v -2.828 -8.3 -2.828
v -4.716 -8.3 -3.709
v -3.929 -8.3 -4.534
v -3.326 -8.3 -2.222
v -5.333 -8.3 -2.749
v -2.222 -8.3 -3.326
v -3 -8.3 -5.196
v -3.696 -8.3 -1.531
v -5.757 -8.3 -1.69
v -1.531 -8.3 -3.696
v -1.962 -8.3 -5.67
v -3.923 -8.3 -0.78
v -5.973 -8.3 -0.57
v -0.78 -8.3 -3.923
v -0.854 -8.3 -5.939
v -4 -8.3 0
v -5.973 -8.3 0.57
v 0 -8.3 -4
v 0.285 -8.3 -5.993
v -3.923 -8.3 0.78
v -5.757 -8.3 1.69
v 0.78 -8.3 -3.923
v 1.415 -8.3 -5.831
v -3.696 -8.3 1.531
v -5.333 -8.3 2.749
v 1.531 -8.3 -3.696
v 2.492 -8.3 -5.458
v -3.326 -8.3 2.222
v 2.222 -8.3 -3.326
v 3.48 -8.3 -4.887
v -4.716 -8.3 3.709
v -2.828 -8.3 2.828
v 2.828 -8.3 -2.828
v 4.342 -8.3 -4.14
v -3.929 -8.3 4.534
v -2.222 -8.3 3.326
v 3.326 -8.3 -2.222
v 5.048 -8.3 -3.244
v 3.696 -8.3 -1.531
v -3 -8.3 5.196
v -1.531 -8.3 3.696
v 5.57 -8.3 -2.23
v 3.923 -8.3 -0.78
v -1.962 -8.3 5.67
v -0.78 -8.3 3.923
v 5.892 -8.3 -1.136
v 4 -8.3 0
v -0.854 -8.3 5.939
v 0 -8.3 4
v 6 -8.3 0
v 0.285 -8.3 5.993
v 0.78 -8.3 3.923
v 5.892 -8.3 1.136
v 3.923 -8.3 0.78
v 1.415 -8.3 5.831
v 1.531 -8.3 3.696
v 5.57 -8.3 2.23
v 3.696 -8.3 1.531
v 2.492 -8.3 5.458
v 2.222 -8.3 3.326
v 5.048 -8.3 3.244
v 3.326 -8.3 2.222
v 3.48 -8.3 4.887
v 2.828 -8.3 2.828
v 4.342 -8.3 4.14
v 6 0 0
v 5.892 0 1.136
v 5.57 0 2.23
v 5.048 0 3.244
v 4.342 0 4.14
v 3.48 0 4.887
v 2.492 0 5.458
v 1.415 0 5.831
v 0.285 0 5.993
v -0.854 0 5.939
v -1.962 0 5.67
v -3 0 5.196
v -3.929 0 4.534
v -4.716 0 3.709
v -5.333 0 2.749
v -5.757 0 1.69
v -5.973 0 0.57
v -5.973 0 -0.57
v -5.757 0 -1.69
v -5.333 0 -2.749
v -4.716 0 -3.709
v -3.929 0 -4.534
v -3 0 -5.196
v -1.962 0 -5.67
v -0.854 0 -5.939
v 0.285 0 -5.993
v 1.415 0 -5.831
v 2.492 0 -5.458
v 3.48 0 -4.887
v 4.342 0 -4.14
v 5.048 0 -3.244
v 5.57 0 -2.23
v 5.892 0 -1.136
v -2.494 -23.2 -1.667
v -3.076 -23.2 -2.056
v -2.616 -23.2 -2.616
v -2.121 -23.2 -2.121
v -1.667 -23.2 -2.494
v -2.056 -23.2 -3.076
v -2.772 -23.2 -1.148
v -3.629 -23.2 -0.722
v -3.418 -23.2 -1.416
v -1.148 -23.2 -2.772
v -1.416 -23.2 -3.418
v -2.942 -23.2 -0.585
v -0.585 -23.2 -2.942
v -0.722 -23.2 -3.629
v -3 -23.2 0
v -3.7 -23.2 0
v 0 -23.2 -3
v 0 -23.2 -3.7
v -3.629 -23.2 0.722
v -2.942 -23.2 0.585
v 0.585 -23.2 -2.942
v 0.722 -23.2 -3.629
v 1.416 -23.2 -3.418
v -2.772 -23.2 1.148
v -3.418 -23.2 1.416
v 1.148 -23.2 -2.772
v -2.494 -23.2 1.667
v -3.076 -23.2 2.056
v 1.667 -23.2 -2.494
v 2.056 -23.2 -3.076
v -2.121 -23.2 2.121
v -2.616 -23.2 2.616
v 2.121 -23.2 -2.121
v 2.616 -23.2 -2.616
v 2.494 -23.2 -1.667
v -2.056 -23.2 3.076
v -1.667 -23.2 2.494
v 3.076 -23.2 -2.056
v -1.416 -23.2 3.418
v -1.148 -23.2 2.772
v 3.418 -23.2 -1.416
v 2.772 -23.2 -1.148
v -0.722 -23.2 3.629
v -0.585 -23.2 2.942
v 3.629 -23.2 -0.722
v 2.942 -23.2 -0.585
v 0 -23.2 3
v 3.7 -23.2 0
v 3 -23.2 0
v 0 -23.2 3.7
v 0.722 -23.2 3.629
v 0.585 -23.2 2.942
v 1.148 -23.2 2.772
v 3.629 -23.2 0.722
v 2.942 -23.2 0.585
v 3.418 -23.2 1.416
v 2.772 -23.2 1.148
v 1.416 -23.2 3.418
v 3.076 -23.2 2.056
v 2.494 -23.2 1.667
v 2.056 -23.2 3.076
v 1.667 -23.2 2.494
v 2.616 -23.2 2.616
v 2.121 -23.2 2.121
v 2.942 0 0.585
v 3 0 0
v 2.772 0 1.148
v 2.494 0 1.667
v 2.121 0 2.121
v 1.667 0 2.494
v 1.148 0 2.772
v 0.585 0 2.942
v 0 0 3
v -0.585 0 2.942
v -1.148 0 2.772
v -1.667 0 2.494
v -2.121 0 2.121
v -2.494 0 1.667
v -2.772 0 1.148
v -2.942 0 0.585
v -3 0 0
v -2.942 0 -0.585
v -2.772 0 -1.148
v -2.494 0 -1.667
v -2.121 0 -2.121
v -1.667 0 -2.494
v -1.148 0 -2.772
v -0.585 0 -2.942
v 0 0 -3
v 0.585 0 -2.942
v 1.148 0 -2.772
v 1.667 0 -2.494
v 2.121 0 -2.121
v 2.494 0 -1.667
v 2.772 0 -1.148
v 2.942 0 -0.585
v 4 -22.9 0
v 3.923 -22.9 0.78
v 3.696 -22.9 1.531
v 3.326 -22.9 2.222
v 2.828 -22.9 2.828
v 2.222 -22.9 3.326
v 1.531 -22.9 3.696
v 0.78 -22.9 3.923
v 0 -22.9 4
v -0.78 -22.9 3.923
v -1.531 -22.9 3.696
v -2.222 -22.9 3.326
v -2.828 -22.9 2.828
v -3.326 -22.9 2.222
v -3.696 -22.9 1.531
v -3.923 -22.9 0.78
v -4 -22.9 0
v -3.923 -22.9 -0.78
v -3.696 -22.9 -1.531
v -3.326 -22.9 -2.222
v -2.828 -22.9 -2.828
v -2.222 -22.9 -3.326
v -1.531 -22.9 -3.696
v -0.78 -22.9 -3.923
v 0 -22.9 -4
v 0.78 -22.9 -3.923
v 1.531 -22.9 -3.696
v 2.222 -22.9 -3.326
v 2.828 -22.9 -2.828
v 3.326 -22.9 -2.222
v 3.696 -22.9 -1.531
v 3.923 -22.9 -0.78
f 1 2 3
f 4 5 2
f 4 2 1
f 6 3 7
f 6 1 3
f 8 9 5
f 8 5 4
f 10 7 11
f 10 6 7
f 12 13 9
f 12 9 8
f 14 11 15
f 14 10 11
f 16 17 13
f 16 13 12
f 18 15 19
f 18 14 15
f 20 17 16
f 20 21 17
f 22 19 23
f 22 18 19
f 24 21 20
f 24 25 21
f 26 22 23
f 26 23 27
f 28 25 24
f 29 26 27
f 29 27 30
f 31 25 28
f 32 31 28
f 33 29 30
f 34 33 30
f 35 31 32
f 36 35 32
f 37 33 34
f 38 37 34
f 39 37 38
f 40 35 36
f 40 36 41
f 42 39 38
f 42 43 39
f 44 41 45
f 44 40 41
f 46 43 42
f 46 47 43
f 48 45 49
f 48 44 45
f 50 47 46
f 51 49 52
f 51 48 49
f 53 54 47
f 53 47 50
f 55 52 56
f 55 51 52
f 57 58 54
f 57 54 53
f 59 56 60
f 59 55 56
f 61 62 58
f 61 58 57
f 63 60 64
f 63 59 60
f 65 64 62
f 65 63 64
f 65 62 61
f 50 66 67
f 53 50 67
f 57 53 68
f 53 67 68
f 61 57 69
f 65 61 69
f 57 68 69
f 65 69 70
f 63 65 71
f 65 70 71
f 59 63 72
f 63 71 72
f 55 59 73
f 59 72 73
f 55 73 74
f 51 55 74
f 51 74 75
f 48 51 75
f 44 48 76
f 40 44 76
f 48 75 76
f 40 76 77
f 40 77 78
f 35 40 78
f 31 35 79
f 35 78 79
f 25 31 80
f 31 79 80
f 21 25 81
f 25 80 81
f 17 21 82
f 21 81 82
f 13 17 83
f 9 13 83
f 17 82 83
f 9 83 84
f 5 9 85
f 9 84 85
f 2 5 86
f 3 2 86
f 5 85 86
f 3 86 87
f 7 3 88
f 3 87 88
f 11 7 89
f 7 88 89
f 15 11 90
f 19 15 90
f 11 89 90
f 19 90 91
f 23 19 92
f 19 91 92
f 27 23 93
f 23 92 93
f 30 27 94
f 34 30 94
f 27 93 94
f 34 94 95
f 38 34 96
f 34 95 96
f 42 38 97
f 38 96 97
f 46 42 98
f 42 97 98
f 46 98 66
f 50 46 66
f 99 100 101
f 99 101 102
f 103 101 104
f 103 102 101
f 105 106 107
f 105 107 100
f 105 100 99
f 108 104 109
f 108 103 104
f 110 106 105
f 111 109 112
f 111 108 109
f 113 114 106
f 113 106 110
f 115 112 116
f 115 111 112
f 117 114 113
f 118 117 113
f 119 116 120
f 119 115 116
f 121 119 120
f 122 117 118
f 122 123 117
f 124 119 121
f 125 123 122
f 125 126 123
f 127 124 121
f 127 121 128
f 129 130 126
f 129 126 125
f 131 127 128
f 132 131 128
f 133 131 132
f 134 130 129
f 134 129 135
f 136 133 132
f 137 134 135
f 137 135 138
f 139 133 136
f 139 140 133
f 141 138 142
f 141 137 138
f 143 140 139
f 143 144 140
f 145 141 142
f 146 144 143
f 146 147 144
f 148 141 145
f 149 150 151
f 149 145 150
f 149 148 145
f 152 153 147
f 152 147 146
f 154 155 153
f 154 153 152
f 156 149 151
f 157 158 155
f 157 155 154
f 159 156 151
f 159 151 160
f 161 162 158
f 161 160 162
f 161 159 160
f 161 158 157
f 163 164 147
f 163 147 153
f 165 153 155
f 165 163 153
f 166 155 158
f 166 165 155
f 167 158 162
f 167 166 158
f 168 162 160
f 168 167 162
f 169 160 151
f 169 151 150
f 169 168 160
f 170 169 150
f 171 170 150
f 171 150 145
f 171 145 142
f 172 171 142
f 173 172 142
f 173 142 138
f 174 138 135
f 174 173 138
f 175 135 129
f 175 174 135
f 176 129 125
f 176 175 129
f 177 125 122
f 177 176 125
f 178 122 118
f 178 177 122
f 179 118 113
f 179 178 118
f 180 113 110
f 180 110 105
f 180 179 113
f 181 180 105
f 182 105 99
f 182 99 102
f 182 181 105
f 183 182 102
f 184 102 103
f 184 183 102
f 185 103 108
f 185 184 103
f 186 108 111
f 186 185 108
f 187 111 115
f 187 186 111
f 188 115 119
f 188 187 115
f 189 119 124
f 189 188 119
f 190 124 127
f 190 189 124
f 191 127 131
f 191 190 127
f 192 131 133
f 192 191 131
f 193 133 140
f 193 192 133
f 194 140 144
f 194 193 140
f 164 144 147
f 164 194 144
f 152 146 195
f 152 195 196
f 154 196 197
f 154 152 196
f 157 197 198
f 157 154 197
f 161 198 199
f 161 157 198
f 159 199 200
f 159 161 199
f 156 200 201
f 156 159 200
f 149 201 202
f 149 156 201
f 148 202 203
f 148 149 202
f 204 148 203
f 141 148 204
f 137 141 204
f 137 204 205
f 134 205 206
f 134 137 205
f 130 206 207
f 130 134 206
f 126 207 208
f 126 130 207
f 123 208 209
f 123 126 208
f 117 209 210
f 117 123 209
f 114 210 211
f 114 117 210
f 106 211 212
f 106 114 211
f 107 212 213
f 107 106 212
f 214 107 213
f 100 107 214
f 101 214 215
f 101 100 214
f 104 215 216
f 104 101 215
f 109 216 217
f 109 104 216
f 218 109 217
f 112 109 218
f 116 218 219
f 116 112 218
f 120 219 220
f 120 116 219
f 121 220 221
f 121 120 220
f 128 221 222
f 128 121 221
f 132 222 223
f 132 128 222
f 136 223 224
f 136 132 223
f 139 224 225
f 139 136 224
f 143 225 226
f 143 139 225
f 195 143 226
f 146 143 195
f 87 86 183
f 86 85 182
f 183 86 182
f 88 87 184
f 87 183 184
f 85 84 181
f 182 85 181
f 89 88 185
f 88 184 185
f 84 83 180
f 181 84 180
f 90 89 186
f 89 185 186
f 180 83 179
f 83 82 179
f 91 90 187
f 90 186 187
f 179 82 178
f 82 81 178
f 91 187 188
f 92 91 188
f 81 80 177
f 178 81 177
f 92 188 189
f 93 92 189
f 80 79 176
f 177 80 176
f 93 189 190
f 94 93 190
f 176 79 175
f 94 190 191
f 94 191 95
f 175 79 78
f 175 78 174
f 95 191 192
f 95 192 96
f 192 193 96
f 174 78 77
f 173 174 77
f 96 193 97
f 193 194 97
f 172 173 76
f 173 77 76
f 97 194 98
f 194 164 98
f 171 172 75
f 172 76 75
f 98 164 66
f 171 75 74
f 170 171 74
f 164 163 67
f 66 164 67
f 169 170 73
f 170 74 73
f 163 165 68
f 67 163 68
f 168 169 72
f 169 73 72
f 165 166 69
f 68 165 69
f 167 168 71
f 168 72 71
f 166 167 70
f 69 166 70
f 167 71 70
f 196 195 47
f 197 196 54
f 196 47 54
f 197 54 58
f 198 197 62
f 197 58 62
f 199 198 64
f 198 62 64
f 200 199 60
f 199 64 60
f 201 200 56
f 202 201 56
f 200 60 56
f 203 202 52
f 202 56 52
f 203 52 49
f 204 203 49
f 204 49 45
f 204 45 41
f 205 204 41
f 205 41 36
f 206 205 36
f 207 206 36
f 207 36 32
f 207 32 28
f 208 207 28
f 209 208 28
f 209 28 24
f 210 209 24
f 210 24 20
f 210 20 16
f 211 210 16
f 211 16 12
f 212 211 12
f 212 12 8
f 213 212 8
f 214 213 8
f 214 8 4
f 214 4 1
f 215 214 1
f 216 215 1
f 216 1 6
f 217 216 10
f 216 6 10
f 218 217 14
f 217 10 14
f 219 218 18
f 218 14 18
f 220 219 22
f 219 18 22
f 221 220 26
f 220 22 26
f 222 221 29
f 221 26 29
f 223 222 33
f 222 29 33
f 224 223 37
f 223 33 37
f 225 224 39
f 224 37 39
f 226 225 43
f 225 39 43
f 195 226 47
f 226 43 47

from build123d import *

# Parameters (mm, degrees)
F0_R     = 6
F0_R_2   = 4
F1_DEPTH = 8.3
F0_R_3   = 3
F2_DEPTH = 23.2
F3_SIZE  = 0.3


with BuildPart() as f1:
    # F0 (on Front) → F1 (new body)
    with BuildSketch(Plane.XZ):
        Circle(F0_R)
        Circle(F0_R_2, mode=Mode.SUBTRACT)
    extrude(amount=F1_DEPTH)

    # F0 (on Front) → F2 (join)
    with BuildSketch(Plane.XZ):
        Circle(F0_R_2)
        Circle(F0_R_3, mode=Mode.SUBTRACT)
    extrude(amount=F2_DEPTH)

    # F3
    f3_edges = [f1.edges().sort_by_distance(p)[0] for p in [
        (-4, -23.2, 0),
    ]]
    chamfer(f3_edges, length=F3_SIZE)


solid = f1.part
